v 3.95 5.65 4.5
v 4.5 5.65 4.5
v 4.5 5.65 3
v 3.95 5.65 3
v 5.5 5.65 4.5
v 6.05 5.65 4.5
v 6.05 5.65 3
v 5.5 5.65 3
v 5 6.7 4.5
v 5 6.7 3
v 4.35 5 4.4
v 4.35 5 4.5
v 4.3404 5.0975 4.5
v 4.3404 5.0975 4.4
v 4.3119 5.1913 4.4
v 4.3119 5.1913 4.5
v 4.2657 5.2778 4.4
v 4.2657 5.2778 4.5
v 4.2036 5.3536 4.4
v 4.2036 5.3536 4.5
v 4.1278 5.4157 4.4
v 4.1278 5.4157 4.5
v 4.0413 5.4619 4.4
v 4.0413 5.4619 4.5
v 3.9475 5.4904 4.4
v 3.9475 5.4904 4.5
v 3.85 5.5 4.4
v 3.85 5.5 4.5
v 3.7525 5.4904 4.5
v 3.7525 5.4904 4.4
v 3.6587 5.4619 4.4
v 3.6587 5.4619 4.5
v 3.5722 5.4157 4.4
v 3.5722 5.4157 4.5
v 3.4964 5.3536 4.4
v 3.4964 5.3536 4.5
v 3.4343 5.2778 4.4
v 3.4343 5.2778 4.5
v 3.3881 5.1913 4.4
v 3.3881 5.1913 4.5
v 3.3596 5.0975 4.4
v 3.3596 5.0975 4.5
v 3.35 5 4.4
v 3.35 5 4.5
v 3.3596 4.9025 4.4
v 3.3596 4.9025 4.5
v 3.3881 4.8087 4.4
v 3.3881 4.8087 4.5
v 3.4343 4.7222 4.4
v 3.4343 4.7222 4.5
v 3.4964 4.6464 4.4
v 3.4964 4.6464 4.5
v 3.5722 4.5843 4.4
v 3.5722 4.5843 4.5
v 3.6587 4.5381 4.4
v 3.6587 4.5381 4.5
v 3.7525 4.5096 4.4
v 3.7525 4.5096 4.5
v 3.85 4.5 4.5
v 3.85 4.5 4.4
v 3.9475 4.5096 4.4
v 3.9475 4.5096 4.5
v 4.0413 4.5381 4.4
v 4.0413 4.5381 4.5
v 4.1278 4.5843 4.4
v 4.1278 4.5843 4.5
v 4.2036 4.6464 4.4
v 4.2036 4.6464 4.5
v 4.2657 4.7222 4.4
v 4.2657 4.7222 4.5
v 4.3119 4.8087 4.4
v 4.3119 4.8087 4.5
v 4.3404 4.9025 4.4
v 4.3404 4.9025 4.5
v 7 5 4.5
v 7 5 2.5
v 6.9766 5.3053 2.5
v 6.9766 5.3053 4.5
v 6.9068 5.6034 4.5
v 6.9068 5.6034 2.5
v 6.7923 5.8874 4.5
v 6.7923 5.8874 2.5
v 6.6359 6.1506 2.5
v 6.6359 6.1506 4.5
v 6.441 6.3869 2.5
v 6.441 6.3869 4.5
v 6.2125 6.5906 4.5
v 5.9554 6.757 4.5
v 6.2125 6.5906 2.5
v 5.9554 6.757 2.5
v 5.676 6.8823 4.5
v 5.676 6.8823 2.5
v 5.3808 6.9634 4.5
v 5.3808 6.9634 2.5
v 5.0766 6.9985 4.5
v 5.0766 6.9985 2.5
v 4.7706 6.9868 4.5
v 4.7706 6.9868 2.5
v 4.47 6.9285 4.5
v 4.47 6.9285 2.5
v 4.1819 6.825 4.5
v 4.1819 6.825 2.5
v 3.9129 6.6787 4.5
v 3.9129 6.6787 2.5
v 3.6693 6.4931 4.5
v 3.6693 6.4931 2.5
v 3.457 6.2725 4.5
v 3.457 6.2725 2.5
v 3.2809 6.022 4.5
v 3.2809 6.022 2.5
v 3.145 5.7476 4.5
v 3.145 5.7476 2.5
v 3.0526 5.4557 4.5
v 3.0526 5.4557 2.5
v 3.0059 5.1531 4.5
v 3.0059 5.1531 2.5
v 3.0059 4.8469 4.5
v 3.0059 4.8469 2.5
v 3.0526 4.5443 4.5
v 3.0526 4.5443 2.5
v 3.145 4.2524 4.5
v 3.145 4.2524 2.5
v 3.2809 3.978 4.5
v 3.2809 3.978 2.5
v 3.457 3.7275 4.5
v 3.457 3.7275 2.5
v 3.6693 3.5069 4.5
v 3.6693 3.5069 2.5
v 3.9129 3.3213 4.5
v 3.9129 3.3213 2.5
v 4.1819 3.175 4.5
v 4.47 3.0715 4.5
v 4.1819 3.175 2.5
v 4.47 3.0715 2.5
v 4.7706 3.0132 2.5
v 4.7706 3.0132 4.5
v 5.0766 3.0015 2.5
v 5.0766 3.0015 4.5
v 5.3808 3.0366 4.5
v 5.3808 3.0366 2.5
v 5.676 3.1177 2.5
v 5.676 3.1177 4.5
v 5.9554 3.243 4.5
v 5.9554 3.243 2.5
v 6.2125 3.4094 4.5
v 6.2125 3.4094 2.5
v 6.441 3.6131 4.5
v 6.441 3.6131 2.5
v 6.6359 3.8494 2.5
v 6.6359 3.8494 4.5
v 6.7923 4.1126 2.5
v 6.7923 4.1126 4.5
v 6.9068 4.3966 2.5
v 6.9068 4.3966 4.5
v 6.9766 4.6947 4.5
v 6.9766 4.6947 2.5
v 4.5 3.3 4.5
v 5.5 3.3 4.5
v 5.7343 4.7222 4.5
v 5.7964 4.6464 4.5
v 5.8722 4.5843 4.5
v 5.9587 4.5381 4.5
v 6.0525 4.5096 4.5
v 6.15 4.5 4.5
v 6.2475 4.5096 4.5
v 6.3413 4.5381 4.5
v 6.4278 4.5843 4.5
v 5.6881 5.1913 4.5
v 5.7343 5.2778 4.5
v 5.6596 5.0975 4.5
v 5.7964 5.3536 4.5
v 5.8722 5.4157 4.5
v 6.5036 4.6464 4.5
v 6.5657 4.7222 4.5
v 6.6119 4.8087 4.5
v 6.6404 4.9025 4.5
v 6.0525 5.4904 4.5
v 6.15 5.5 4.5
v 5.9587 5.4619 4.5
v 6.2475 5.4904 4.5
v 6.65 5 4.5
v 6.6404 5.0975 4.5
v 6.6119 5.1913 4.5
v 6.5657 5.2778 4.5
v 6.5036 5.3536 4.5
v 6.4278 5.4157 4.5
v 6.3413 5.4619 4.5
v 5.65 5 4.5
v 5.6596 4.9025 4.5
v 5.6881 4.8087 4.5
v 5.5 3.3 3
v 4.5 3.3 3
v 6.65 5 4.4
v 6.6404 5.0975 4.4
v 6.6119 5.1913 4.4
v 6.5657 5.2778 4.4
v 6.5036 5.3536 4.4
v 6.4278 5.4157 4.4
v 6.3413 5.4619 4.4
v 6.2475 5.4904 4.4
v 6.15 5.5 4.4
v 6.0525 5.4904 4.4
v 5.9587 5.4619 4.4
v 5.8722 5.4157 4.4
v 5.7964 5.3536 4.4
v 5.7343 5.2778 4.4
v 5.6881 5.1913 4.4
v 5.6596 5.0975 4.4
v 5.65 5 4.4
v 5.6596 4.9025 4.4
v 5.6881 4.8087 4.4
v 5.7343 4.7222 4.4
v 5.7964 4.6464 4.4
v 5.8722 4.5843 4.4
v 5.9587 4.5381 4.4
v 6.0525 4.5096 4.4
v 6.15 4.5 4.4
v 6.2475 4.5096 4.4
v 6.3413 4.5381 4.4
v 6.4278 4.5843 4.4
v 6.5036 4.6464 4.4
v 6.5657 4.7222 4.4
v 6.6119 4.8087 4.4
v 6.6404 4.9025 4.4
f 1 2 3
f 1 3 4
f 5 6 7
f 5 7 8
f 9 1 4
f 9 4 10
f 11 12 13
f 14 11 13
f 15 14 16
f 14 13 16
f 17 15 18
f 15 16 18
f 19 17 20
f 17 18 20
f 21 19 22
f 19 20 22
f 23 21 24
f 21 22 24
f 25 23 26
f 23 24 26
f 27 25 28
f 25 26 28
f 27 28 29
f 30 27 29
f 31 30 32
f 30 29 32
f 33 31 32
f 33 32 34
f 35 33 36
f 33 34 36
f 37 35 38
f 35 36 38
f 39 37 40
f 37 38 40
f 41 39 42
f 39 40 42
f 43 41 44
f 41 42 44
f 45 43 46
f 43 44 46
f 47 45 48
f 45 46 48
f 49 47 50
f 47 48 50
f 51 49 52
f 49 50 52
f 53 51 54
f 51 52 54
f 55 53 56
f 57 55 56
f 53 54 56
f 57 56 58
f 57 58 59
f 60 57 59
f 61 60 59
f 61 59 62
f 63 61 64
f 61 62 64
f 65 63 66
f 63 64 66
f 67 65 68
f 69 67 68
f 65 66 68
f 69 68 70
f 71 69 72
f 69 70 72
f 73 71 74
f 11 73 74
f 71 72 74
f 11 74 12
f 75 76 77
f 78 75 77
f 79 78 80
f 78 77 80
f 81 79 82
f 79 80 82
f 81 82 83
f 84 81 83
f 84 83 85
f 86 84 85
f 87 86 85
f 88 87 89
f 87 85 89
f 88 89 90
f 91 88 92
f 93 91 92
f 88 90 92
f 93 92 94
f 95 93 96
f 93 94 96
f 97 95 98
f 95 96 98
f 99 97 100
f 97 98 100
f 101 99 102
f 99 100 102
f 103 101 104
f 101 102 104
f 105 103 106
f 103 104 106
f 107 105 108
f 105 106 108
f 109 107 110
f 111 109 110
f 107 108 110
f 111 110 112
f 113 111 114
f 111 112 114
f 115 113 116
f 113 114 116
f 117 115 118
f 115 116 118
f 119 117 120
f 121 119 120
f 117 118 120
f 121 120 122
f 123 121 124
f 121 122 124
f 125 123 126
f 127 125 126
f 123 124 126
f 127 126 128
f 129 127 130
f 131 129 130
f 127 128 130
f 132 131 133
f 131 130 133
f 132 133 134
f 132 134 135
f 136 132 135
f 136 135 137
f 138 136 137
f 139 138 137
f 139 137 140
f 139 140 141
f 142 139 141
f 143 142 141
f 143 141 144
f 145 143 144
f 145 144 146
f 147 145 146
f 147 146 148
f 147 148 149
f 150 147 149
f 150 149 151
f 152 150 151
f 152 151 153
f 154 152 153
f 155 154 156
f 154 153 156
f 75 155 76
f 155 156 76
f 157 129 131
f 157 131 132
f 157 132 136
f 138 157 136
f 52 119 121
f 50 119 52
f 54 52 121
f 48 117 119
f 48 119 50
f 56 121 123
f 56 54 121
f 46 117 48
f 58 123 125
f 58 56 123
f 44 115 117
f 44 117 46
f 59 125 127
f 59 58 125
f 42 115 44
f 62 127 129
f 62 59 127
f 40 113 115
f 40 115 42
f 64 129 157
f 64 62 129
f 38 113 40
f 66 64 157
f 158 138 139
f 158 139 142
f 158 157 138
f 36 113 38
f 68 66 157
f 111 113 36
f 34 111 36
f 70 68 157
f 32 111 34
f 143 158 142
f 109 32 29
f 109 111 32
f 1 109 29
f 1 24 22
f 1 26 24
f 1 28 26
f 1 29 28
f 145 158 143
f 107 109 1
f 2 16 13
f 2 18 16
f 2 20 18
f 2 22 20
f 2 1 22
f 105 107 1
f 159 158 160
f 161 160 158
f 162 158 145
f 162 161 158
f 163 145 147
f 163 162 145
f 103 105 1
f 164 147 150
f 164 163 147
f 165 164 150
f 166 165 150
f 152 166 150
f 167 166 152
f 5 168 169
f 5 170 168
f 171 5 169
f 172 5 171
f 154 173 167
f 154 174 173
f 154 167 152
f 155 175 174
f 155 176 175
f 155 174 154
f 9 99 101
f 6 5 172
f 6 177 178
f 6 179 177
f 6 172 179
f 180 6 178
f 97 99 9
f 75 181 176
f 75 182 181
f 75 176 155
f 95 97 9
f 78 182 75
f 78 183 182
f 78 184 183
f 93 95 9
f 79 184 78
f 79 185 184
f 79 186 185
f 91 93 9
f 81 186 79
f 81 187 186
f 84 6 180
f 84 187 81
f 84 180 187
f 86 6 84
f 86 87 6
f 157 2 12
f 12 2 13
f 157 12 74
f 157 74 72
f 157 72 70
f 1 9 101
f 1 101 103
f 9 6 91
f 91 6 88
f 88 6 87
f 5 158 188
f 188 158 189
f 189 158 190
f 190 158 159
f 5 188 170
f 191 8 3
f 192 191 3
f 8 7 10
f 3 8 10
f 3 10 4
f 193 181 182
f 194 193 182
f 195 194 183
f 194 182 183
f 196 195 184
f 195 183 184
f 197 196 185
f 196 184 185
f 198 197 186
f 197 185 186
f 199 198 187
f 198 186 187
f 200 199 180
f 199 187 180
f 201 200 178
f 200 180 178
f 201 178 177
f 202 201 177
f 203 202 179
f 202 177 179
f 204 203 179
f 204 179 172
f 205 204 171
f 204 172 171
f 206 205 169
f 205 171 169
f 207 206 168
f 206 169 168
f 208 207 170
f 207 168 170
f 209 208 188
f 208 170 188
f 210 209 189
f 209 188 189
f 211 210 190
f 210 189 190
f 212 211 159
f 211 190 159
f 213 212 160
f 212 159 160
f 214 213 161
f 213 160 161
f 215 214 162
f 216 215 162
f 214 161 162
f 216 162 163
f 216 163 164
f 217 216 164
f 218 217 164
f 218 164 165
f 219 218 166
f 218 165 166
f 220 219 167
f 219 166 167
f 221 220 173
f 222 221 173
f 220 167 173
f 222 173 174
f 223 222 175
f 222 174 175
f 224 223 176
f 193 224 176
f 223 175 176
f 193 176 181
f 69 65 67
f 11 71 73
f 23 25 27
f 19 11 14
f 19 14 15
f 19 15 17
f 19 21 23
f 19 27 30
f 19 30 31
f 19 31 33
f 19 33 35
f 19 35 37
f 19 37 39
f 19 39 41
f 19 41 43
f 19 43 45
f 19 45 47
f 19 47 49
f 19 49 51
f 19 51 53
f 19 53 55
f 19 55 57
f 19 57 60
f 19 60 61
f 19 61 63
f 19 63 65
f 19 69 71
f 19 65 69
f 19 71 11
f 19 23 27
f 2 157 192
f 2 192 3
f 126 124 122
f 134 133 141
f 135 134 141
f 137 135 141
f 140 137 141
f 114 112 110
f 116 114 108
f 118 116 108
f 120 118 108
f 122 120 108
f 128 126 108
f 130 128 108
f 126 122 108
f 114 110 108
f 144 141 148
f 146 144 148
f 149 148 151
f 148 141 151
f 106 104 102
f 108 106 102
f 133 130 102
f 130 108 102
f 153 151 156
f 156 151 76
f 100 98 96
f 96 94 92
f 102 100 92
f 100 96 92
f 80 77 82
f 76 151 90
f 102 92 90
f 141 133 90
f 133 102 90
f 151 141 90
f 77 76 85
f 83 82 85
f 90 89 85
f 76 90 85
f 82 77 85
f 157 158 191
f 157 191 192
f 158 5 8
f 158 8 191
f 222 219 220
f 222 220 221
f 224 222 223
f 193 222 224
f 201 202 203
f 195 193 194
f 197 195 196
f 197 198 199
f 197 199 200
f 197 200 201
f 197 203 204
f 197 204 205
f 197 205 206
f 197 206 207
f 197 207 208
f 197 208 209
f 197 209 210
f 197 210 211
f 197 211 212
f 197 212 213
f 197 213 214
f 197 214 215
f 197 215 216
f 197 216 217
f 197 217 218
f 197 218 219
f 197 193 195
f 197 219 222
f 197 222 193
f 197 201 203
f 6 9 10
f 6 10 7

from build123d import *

# Parameters (mm, degrees)
SKETCH004_R     = 2
PAD001_DEPTH    = 2
POCKET001_DEPTH = 1.5
SKETCH005_R     = 0.5
POCKET002_DEPTH = 0.1


with BuildPart() as part:
    # Sketch004 → Pad001 (new body)
    with BuildSketch(Plane.XY.offset(2.5)):
        with Locations((5, 5)):
            Circle(SKETCH004_R)
    extrude(amount=PAD001_DEPTH)

    # Sketch003 (on Face3 of Pad001) → Pocket001 (cut)
    with BuildSketch(Plane.XY.offset(4.5)):
        Polygon((4.5, 3.3), (4.5, 5.65), (3.95, 5.65), (5, 6.7), (6.05, 5.65), (5.5, 5.65), (5.5, 3.3), align=None)
    extrude(amount=-POCKET001_DEPTH, mode=Mode.SUBTRACT)

    # Sketch005 (on Face3 of Pocket001) → Pocket002 (cut)
    with BuildSketch(Plane.XY.offset(4.5)):
        with Locations((3.85, 5)):
            Circle(SKETCH005_R)
        with Locations((6.15, 5)):
            Circle(SKETCH005_R)
    extrude(amount=-POCKET002_DEPTH, mode=Mode.SUBTRACT)


solid = part.part
